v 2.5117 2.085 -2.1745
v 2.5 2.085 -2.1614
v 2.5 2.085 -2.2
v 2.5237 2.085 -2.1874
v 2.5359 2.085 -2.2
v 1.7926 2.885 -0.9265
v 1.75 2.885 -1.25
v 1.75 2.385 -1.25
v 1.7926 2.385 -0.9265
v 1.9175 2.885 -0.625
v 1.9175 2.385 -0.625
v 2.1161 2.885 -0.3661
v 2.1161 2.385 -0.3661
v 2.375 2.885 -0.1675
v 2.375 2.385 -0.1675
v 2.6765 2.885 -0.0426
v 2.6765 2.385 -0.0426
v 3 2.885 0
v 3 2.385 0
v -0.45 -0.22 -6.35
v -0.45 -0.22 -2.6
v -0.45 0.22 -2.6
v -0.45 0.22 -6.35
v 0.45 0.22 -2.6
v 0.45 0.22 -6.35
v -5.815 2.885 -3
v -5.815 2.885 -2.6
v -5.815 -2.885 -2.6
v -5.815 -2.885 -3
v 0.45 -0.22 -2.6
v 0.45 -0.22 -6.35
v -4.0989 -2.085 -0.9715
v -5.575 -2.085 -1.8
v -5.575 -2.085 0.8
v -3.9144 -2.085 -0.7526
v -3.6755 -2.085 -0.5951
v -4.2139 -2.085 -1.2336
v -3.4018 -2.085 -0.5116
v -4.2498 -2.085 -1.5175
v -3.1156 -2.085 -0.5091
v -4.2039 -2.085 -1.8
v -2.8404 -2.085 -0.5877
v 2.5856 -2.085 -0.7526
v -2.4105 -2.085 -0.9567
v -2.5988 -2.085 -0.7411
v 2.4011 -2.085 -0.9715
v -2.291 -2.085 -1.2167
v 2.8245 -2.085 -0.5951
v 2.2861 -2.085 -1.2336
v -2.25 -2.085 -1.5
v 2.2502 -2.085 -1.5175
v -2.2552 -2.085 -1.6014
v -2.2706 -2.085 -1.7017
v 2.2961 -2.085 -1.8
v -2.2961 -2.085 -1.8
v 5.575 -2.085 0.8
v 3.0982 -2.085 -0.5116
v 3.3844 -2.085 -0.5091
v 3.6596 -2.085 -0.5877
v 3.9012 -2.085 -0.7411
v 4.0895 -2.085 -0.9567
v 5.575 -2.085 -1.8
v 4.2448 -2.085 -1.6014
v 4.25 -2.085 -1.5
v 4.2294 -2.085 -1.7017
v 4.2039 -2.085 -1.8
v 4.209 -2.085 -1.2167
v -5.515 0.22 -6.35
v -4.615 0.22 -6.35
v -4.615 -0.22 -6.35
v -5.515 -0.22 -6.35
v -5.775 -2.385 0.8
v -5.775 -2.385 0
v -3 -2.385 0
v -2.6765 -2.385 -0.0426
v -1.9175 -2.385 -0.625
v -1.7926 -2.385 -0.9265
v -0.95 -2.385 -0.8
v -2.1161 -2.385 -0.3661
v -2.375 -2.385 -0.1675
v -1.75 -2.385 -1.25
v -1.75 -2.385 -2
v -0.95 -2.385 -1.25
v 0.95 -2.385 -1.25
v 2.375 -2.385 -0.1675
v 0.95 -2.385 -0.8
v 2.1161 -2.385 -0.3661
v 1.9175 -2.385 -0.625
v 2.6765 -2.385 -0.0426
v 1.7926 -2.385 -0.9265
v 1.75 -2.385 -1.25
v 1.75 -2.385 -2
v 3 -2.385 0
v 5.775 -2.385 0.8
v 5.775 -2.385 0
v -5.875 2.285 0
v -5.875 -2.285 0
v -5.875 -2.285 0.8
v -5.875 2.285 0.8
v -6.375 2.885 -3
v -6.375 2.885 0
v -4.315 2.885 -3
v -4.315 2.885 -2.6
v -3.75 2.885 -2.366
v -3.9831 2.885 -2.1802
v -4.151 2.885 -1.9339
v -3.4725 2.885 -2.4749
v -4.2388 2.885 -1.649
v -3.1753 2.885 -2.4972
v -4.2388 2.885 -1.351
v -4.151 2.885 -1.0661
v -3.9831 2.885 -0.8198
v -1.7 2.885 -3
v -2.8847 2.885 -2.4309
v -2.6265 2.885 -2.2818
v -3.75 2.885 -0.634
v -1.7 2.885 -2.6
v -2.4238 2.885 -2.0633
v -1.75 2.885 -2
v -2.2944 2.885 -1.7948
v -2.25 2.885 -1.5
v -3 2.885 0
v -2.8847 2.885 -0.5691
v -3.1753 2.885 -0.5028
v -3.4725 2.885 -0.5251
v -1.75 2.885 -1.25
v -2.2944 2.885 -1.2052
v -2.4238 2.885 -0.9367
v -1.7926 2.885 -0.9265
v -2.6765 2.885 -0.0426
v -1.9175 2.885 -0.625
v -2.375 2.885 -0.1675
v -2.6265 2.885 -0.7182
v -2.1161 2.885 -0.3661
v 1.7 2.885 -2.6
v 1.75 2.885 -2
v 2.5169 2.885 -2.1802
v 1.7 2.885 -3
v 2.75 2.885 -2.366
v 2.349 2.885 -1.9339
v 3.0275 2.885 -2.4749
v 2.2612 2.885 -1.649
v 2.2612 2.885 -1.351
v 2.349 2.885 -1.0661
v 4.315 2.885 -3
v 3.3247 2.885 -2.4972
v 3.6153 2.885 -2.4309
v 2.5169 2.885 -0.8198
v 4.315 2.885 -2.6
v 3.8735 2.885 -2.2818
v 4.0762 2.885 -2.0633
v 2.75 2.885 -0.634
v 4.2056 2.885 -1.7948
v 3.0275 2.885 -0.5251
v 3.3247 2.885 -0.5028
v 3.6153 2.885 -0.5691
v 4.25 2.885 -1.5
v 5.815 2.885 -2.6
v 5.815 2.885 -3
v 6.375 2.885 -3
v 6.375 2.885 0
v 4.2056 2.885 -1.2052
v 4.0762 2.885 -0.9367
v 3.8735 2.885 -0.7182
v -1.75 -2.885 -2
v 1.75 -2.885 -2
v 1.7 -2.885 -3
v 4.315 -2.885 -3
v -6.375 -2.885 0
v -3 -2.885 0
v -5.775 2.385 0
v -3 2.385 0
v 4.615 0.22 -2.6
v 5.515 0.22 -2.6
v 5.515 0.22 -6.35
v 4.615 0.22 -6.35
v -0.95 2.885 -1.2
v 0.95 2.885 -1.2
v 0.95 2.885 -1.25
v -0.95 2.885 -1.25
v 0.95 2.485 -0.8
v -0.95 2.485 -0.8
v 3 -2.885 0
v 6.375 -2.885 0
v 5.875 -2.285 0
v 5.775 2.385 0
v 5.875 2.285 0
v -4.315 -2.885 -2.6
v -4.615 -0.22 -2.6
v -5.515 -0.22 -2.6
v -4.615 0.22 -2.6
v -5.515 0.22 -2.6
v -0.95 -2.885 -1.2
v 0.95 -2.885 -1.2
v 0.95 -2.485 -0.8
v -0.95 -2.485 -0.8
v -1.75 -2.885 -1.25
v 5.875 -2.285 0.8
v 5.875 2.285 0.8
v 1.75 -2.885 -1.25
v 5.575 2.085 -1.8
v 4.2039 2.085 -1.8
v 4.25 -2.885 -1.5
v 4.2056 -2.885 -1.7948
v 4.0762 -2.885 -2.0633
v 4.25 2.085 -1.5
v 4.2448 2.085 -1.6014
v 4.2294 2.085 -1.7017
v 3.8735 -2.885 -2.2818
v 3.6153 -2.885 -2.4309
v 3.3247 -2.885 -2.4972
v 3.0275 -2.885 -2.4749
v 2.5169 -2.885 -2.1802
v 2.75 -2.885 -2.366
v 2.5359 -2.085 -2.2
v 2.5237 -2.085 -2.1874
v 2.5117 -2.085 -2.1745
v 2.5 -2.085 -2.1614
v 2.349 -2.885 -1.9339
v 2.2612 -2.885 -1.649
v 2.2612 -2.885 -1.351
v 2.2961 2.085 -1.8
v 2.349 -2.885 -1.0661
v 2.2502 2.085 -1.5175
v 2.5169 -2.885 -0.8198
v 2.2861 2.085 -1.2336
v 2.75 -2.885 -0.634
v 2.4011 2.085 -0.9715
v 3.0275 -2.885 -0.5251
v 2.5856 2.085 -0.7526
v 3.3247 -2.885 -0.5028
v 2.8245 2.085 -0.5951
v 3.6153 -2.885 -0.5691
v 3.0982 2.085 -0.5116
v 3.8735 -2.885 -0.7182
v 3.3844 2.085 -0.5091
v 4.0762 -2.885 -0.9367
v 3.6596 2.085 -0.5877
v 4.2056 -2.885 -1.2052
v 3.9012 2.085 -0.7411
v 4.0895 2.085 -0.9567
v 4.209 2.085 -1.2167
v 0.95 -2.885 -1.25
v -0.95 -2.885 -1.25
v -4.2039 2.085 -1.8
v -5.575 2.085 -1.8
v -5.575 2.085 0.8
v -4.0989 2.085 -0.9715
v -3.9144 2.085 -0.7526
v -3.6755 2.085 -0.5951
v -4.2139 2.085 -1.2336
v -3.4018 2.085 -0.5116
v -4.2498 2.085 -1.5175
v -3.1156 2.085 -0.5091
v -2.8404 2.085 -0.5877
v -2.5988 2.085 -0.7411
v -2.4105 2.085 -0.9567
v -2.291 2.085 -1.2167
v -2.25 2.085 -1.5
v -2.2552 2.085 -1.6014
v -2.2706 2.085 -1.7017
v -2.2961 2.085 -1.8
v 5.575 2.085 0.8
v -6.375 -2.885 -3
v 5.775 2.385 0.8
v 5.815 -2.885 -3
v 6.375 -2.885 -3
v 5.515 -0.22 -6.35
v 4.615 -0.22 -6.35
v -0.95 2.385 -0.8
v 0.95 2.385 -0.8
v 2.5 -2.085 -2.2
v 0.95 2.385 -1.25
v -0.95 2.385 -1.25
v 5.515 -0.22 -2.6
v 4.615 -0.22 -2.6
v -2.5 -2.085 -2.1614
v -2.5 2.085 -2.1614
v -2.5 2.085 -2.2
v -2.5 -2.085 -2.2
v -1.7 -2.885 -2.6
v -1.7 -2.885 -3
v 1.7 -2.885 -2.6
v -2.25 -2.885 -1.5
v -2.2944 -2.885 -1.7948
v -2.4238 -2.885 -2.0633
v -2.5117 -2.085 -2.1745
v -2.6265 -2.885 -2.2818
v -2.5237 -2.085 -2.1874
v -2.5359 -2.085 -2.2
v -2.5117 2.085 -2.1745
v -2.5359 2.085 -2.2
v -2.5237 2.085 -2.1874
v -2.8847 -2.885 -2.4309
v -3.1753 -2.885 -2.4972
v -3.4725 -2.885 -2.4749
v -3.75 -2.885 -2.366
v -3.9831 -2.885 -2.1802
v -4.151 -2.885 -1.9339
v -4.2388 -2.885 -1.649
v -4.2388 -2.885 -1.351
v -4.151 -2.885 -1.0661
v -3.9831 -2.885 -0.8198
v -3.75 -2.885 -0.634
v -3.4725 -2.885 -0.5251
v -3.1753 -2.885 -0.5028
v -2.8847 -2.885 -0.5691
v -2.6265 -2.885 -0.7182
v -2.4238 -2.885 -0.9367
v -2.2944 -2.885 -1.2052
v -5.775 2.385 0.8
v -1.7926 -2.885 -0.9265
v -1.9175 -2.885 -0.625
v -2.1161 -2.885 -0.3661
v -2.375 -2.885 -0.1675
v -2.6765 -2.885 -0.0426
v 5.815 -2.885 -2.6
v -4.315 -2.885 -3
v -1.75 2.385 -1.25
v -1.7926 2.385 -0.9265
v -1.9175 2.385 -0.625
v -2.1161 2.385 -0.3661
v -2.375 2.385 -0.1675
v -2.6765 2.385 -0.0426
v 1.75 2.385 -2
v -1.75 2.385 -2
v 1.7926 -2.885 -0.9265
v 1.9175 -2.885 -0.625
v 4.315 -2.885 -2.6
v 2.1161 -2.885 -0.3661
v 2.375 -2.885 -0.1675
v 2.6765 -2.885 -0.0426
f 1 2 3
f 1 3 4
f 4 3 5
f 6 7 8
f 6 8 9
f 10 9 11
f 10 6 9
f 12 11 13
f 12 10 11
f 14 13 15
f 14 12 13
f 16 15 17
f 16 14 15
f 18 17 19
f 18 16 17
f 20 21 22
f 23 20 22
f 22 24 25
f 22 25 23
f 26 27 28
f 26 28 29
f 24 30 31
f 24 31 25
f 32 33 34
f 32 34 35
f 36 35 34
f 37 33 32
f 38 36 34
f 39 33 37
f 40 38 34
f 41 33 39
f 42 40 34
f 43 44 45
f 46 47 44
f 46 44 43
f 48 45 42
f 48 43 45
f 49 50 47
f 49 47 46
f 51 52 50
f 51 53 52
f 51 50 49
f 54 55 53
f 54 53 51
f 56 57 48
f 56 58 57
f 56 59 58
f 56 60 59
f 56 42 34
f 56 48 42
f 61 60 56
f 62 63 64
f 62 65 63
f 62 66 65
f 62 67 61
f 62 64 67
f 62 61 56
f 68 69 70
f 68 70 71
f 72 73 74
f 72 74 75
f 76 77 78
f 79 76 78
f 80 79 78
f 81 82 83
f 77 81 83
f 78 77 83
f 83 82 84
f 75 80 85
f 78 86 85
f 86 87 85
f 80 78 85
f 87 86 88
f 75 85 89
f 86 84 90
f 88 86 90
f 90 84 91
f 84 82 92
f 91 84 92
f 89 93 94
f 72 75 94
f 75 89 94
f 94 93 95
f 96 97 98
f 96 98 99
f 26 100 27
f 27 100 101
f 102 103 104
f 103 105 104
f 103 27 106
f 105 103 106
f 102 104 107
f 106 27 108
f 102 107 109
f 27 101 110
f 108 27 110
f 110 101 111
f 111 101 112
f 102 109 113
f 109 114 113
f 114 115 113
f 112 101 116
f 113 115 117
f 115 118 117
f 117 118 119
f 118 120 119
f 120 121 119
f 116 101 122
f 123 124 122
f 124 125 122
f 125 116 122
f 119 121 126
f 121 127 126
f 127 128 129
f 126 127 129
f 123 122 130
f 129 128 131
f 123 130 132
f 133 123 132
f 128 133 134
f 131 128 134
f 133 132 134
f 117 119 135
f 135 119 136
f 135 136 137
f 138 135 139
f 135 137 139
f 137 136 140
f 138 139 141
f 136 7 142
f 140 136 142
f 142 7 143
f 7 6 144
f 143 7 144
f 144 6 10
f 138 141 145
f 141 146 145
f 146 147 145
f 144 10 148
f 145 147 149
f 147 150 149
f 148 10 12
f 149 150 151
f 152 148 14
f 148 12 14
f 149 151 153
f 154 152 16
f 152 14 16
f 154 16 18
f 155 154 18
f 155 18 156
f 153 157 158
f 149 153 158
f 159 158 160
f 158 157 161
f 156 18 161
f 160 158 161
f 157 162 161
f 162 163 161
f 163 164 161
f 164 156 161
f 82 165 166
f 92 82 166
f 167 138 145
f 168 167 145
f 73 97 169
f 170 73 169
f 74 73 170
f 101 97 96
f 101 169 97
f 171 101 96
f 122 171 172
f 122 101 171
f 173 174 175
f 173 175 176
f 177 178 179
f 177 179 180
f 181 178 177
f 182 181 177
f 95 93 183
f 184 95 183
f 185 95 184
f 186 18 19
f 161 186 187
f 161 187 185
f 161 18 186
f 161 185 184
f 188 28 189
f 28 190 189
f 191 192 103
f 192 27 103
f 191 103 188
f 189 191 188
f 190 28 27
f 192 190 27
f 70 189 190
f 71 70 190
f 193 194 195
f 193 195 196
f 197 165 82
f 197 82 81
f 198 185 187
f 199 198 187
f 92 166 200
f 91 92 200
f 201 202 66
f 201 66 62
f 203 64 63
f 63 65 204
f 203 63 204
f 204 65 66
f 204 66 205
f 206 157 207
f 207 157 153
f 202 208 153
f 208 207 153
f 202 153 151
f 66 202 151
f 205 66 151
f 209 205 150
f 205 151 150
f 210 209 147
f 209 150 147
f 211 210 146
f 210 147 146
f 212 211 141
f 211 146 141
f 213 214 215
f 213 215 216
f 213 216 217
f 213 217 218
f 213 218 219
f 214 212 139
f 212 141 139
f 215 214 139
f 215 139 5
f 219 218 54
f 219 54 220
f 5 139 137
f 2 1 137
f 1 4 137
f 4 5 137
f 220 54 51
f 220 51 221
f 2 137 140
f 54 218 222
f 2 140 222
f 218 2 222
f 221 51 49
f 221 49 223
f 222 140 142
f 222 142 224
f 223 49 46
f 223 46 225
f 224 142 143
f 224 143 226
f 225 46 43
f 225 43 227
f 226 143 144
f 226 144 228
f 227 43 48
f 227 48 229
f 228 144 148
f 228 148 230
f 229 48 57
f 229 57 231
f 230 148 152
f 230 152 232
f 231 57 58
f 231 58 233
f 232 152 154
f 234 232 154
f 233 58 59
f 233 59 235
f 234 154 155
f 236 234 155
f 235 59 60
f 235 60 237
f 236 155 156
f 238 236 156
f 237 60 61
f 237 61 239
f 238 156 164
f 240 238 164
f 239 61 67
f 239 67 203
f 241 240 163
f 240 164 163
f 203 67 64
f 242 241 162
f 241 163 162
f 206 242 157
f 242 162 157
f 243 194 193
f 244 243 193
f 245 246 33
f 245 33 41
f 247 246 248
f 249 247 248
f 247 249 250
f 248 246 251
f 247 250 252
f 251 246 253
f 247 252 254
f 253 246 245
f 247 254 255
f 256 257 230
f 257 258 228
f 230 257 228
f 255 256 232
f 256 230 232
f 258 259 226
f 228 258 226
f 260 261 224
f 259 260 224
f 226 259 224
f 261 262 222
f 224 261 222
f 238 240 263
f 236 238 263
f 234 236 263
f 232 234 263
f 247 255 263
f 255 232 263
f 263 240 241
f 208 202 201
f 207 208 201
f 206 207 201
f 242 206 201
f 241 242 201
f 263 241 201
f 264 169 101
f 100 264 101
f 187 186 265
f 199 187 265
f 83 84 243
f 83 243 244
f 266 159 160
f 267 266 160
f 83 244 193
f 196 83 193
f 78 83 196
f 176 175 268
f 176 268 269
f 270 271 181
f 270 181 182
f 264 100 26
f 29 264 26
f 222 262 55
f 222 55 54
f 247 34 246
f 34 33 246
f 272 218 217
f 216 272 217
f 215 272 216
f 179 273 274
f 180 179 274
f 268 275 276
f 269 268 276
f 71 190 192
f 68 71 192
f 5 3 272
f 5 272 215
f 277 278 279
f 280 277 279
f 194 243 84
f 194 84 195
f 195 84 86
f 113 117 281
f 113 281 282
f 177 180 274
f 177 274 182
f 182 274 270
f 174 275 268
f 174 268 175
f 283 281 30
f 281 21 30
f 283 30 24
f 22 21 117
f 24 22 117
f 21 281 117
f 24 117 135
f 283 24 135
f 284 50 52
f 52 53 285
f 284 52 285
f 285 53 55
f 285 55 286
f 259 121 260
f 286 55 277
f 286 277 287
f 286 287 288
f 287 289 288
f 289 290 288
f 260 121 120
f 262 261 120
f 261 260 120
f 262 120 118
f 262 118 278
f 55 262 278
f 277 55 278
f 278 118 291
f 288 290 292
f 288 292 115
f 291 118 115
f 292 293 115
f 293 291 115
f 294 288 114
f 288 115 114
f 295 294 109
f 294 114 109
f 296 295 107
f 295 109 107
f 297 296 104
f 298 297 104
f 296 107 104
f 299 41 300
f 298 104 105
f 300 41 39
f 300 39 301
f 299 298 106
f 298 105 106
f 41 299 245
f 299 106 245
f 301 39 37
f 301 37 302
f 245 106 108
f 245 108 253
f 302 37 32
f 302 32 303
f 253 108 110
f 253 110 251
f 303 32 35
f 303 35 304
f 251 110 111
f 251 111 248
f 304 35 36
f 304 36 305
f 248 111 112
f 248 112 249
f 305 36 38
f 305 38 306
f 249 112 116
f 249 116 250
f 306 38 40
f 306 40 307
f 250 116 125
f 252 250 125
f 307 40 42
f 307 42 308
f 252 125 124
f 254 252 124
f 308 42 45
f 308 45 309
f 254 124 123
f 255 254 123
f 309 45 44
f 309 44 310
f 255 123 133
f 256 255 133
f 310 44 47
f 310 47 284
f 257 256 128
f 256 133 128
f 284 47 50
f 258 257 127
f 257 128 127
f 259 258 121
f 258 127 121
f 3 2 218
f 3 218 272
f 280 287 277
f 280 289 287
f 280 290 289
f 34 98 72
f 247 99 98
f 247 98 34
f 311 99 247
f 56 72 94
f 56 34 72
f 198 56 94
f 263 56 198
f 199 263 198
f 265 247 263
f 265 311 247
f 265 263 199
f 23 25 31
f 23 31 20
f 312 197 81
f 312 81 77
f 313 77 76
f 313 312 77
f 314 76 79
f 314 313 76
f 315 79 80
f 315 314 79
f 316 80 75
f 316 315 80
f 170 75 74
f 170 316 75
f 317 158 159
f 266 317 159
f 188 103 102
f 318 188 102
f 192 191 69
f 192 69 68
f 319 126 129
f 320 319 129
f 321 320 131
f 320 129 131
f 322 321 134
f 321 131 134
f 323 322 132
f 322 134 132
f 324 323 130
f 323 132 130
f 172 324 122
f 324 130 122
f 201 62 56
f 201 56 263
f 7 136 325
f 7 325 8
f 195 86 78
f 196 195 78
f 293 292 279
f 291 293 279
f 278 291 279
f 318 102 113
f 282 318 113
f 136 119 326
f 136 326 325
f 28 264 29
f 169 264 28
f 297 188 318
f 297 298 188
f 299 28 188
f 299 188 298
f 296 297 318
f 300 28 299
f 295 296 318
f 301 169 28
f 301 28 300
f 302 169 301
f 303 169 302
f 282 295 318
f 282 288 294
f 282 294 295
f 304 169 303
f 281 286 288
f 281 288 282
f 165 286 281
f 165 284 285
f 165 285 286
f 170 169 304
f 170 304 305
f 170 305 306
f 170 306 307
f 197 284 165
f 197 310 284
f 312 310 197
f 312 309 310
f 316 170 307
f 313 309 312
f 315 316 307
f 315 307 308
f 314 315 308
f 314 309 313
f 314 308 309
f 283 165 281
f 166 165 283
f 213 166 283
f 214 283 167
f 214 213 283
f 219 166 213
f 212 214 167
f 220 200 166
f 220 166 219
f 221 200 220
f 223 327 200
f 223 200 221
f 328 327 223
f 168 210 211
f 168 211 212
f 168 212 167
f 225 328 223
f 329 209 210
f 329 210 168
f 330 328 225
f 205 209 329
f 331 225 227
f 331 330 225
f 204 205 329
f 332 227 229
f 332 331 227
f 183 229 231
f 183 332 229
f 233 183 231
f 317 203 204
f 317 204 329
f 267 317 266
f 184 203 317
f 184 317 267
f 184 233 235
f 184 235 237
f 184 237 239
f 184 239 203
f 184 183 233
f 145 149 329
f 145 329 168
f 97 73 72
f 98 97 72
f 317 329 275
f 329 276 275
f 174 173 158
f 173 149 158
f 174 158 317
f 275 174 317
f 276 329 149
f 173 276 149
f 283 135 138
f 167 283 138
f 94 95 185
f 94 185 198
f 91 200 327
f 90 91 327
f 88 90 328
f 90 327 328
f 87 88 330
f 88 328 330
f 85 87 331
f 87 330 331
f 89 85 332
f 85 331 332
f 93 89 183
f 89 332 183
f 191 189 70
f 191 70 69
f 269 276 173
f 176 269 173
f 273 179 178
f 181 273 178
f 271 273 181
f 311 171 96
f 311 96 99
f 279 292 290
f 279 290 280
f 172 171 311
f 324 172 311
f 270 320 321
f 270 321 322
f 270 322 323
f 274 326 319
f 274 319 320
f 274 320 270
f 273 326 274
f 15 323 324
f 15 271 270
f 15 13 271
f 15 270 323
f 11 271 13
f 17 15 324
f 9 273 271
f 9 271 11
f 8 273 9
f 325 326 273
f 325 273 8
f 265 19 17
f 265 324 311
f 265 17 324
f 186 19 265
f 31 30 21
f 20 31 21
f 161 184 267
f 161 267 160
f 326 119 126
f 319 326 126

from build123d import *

# Parameters (mm, degrees)
ESQUISSE1_W                  = 12.75
ESQUISSE1_H                  = 5.77
BASE_EXTRUSION_DEPTH         = 3
ESQUISSE2_W                  = 1.5
ESQUISSE2_H                  = 0.4
ESQUISSE2_W_2                = 3.4
ENL_V_MAT_EXTRU_1_DEPTH      = 3.885
ENL_V_MAT_EXTRU_1_DEPTH_BACK = 3.885
COQUE1_T                     = -0.8
ESQUISSE3_W                  = 0.9
ESQUISSE3_H                  = 0.44
BOSS_EXTRU_1_DEPTH           = 3.75
ESQUISSE4_W                  = 11.75
ESQUISSE4_H                  = 4.77
ESQUISSE4_W_2                = 11.15
ESQUISSE4_H_2                = 4.17
BOSS_EXTRU_2_DEPTH           = 0.8
ENL_V_MAT_EXTRU_2_DEPTH      = 0.5
SYM_TRIE2_COPY_1_DEPTH       = 0.5
CHANFREIN1_SIZE              = 0.1
ESQUISSE6_W                  = 1.9
ESQUISSE6_H                  = 0.45
BOSS_EXTRU_3_DEPTH           = 0.5
CHANFREIN2_SIZE              = 0.4
CHANFREIN2_OF_SYM_TRIE3_SIZE = 0.4
ESQUISSE7_R                  = 1
ENL_V_MAT_EXTRU_3_DEPTH      = 3.885
ENL_V_MAT_EXTRU_3_DEPTH_BACK = 3.885


with BuildPart() as part:
    # Esquisse1 → Base-Extrusion (new body)
    with BuildSketch(Plane.XY):
        Rectangle(ESQUISSE1_W, ESQUISSE1_H)
    extrude(amount=-BASE_EXTRUSION_DEPTH)

    # Esquisse2 → Enlèv. mat.-Extru.1 (cut, two sides)
    with BuildSketch(Plane(origin=(0, 0, 0), x_dir=(1, 0, 0), z_dir=(0, 1, 0))) as enl_v_mat_extru_1_sk:
        with Locations((-5.065, 2.8)):
            Rectangle(ESQUISSE2_W, ESQUISSE2_H)
        with Locations((5.065, 2.8)):
            Rectangle(ESQUISSE2_W, ESQUISSE2_H)
        with Locations((0, 2.8)):
            Rectangle(ESQUISSE2_W_2, ESQUISSE2_H)
    extrude(amount=ENL_V_MAT_EXTRU_1_DEPTH, mode=Mode.SUBTRACT)
    extrude(enl_v_mat_extru_1_sk.sketch, amount=-ENL_V_MAT_EXTRU_1_DEPTH_BACK, mode=Mode.SUBTRACT)

    # Coque1
    coque1_openings = [part.faces().sort_by_distance(p)[0] for p in [
        (0, 0, 0),
    ]]
    offset(amount=COQUE1_T, openings=coque1_openings, kind=Kind.INTERSECTION)

    # Esquisse3 → Boss.-Extru.1 (add)
    with BuildSketch(Plane(origin=(0, 0, -2.6), x_dir=(-1, 0, 0), z_dir=(0, 0, -1))):
        with Locations((-5.065, 0)):
            Rectangle(ESQUISSE3_W, ESQUISSE3_H)
        with Locations((5.065, 0)):
            Rectangle(ESQUISSE3_W, ESQUISSE3_H)
        Rectangle(ESQUISSE3_W, ESQUISSE3_H)
    extrude(amount=BOSS_EXTRU_1_DEPTH)

    # Esquisse4 → Boss.-Extru.2 (add)
    with BuildSketch(Plane.XY):
        Rectangle(ESQUISSE4_W, ESQUISSE4_H)
        Rectangle(ESQUISSE4_W_2, ESQUISSE4_H_2, mode=Mode.SUBTRACT)
    extrude(amount=BOSS_EXTRU_2_DEPTH)

    # Esquisse5 → Enlèv. mat.-Extru.2 (cut)
    with BuildSketch(Plane(origin=(0, 2.885, 0), x_dir=(1, 0, 0), z_dir=(0, 1, 0))):
        with BuildLine():
            Line((3, 0), (0, 0))
            Line((0, 0), (0, 2))
            Line((0, 2), (1.75, 2))
            Line((1.75, 2), (1.75, 1.25))
            ThreePointArc((1.75, 1.25), (2.116116524, 0.366116524), (3, 0))
        make_face()
    enl_v_mat_extru_2 = extrude(amount=-ENL_V_MAT_EXTRU_2_DEPTH, mode=Mode.SUBTRACT)

    # Symétrie1: Enlèv. mat.-Extru.2 across plane
    add(enl_v_mat_extru_2.mirror(Plane(origin=(0, 0, 0), x_dir=(0, 0, 1), z_dir=(1, 0, 0))), mode=Mode.SUBTRACT)

    # Symétrie2: Enlèv. mat.-Extru.2 across plane
    add(enl_v_mat_extru_2.mirror(Plane.ZX), mode=Mode.SUBTRACT)

    # Symétrie2 copy 1 sketch → Symétrie2 copy 1 (cut)
    with BuildSketch(Plane(origin=(0, -2.885, 0), x_dir=(-1, 0, 0), z_dir=(0, -1, 0))):
        with BuildLine():
            Line((3, 0), (0, 0))
            Line((0, 0), (0, 2))
            Line((0, 2), (1.75, 2))
            Line((1.75, 2), (1.75, 1.25))
            ThreePointArc((1.75, 1.25), (2.116116524, 0.366116524), (3, 0))
        make_face()
    extrude(amount=-SYM_TRIE2_COPY_1_DEPTH, mode=Mode.SUBTRACT)

    # Chanfrein1
    chanfrein1_edges = [part.edges().sort_by_distance(p)[0] for p in [
        (5.875, -2.385, 0.4),
        (5.875, 2.385, 0.4),
        (-5.875, 2.385, 0.4),
        (-5.875, -2.385, 0.4),
    ]]
    chamfer(chanfrein1_edges, length=CHANFREIN1_SIZE)

    # Esquisse6 → Boss.-Extru.3 (add)
    with BuildSketch(Plane(origin=(0, 2.385, 0), x_dir=(-1, 0, 0), z_dir=(0, 1, 0))):
        with Locations((0, -1.025)):
            Rectangle(ESQUISSE6_W, ESQUISSE6_H)
    boss_extru_3 = extrude(amount=BOSS_EXTRU_3_DEPTH)

    # Chanfrein2
    chanfrein2_edges = [part.edges().sort_by_distance(p)[0] for p in [
        (0, 2.885, -0.8),
    ]]
    chamfer(chanfrein2_edges, length=CHANFREIN2_SIZE)

    # Symétrie3: Boss.-Extru.3 across plane
    add(boss_extru_3.mirror(Plane.ZX))

    # Chanfrein2 of Symétrie3
    chanfrein2_of_sym_trie3_edges = [part.edges().sort_by_distance(p)[0] for p in [
        (0, -2.885, -0.8),
    ]]
    chamfer(chanfrein2_of_sym_trie3_edges, length=CHANFREIN2_OF_SYM_TRIE3_SIZE)

    # Esquisse7 → Enlèv. mat.-Extru.3 (cut, two sides)
    with BuildSketch(Plane(origin=(0, 0, 0), x_dir=(1, 0, 0), z_dir=(0, 1, 0))) as enl_v_mat_extru_3_sk:
        with Locations((3.25, 1.5)):
            Circle(ESQUISSE7_R)
        with Locations((-3.25, 1.5)):
            Circle(ESQUISSE7_R)
    extrude(amount=ENL_V_MAT_EXTRU_3_DEPTH, mode=Mode.SUBTRACT)
    extrude(enl_v_mat_extru_3_sk.sketch, amount=-ENL_V_MAT_EXTRU_3_DEPTH_BACK, mode=Mode.SUBTRACT)


solid = part.part
